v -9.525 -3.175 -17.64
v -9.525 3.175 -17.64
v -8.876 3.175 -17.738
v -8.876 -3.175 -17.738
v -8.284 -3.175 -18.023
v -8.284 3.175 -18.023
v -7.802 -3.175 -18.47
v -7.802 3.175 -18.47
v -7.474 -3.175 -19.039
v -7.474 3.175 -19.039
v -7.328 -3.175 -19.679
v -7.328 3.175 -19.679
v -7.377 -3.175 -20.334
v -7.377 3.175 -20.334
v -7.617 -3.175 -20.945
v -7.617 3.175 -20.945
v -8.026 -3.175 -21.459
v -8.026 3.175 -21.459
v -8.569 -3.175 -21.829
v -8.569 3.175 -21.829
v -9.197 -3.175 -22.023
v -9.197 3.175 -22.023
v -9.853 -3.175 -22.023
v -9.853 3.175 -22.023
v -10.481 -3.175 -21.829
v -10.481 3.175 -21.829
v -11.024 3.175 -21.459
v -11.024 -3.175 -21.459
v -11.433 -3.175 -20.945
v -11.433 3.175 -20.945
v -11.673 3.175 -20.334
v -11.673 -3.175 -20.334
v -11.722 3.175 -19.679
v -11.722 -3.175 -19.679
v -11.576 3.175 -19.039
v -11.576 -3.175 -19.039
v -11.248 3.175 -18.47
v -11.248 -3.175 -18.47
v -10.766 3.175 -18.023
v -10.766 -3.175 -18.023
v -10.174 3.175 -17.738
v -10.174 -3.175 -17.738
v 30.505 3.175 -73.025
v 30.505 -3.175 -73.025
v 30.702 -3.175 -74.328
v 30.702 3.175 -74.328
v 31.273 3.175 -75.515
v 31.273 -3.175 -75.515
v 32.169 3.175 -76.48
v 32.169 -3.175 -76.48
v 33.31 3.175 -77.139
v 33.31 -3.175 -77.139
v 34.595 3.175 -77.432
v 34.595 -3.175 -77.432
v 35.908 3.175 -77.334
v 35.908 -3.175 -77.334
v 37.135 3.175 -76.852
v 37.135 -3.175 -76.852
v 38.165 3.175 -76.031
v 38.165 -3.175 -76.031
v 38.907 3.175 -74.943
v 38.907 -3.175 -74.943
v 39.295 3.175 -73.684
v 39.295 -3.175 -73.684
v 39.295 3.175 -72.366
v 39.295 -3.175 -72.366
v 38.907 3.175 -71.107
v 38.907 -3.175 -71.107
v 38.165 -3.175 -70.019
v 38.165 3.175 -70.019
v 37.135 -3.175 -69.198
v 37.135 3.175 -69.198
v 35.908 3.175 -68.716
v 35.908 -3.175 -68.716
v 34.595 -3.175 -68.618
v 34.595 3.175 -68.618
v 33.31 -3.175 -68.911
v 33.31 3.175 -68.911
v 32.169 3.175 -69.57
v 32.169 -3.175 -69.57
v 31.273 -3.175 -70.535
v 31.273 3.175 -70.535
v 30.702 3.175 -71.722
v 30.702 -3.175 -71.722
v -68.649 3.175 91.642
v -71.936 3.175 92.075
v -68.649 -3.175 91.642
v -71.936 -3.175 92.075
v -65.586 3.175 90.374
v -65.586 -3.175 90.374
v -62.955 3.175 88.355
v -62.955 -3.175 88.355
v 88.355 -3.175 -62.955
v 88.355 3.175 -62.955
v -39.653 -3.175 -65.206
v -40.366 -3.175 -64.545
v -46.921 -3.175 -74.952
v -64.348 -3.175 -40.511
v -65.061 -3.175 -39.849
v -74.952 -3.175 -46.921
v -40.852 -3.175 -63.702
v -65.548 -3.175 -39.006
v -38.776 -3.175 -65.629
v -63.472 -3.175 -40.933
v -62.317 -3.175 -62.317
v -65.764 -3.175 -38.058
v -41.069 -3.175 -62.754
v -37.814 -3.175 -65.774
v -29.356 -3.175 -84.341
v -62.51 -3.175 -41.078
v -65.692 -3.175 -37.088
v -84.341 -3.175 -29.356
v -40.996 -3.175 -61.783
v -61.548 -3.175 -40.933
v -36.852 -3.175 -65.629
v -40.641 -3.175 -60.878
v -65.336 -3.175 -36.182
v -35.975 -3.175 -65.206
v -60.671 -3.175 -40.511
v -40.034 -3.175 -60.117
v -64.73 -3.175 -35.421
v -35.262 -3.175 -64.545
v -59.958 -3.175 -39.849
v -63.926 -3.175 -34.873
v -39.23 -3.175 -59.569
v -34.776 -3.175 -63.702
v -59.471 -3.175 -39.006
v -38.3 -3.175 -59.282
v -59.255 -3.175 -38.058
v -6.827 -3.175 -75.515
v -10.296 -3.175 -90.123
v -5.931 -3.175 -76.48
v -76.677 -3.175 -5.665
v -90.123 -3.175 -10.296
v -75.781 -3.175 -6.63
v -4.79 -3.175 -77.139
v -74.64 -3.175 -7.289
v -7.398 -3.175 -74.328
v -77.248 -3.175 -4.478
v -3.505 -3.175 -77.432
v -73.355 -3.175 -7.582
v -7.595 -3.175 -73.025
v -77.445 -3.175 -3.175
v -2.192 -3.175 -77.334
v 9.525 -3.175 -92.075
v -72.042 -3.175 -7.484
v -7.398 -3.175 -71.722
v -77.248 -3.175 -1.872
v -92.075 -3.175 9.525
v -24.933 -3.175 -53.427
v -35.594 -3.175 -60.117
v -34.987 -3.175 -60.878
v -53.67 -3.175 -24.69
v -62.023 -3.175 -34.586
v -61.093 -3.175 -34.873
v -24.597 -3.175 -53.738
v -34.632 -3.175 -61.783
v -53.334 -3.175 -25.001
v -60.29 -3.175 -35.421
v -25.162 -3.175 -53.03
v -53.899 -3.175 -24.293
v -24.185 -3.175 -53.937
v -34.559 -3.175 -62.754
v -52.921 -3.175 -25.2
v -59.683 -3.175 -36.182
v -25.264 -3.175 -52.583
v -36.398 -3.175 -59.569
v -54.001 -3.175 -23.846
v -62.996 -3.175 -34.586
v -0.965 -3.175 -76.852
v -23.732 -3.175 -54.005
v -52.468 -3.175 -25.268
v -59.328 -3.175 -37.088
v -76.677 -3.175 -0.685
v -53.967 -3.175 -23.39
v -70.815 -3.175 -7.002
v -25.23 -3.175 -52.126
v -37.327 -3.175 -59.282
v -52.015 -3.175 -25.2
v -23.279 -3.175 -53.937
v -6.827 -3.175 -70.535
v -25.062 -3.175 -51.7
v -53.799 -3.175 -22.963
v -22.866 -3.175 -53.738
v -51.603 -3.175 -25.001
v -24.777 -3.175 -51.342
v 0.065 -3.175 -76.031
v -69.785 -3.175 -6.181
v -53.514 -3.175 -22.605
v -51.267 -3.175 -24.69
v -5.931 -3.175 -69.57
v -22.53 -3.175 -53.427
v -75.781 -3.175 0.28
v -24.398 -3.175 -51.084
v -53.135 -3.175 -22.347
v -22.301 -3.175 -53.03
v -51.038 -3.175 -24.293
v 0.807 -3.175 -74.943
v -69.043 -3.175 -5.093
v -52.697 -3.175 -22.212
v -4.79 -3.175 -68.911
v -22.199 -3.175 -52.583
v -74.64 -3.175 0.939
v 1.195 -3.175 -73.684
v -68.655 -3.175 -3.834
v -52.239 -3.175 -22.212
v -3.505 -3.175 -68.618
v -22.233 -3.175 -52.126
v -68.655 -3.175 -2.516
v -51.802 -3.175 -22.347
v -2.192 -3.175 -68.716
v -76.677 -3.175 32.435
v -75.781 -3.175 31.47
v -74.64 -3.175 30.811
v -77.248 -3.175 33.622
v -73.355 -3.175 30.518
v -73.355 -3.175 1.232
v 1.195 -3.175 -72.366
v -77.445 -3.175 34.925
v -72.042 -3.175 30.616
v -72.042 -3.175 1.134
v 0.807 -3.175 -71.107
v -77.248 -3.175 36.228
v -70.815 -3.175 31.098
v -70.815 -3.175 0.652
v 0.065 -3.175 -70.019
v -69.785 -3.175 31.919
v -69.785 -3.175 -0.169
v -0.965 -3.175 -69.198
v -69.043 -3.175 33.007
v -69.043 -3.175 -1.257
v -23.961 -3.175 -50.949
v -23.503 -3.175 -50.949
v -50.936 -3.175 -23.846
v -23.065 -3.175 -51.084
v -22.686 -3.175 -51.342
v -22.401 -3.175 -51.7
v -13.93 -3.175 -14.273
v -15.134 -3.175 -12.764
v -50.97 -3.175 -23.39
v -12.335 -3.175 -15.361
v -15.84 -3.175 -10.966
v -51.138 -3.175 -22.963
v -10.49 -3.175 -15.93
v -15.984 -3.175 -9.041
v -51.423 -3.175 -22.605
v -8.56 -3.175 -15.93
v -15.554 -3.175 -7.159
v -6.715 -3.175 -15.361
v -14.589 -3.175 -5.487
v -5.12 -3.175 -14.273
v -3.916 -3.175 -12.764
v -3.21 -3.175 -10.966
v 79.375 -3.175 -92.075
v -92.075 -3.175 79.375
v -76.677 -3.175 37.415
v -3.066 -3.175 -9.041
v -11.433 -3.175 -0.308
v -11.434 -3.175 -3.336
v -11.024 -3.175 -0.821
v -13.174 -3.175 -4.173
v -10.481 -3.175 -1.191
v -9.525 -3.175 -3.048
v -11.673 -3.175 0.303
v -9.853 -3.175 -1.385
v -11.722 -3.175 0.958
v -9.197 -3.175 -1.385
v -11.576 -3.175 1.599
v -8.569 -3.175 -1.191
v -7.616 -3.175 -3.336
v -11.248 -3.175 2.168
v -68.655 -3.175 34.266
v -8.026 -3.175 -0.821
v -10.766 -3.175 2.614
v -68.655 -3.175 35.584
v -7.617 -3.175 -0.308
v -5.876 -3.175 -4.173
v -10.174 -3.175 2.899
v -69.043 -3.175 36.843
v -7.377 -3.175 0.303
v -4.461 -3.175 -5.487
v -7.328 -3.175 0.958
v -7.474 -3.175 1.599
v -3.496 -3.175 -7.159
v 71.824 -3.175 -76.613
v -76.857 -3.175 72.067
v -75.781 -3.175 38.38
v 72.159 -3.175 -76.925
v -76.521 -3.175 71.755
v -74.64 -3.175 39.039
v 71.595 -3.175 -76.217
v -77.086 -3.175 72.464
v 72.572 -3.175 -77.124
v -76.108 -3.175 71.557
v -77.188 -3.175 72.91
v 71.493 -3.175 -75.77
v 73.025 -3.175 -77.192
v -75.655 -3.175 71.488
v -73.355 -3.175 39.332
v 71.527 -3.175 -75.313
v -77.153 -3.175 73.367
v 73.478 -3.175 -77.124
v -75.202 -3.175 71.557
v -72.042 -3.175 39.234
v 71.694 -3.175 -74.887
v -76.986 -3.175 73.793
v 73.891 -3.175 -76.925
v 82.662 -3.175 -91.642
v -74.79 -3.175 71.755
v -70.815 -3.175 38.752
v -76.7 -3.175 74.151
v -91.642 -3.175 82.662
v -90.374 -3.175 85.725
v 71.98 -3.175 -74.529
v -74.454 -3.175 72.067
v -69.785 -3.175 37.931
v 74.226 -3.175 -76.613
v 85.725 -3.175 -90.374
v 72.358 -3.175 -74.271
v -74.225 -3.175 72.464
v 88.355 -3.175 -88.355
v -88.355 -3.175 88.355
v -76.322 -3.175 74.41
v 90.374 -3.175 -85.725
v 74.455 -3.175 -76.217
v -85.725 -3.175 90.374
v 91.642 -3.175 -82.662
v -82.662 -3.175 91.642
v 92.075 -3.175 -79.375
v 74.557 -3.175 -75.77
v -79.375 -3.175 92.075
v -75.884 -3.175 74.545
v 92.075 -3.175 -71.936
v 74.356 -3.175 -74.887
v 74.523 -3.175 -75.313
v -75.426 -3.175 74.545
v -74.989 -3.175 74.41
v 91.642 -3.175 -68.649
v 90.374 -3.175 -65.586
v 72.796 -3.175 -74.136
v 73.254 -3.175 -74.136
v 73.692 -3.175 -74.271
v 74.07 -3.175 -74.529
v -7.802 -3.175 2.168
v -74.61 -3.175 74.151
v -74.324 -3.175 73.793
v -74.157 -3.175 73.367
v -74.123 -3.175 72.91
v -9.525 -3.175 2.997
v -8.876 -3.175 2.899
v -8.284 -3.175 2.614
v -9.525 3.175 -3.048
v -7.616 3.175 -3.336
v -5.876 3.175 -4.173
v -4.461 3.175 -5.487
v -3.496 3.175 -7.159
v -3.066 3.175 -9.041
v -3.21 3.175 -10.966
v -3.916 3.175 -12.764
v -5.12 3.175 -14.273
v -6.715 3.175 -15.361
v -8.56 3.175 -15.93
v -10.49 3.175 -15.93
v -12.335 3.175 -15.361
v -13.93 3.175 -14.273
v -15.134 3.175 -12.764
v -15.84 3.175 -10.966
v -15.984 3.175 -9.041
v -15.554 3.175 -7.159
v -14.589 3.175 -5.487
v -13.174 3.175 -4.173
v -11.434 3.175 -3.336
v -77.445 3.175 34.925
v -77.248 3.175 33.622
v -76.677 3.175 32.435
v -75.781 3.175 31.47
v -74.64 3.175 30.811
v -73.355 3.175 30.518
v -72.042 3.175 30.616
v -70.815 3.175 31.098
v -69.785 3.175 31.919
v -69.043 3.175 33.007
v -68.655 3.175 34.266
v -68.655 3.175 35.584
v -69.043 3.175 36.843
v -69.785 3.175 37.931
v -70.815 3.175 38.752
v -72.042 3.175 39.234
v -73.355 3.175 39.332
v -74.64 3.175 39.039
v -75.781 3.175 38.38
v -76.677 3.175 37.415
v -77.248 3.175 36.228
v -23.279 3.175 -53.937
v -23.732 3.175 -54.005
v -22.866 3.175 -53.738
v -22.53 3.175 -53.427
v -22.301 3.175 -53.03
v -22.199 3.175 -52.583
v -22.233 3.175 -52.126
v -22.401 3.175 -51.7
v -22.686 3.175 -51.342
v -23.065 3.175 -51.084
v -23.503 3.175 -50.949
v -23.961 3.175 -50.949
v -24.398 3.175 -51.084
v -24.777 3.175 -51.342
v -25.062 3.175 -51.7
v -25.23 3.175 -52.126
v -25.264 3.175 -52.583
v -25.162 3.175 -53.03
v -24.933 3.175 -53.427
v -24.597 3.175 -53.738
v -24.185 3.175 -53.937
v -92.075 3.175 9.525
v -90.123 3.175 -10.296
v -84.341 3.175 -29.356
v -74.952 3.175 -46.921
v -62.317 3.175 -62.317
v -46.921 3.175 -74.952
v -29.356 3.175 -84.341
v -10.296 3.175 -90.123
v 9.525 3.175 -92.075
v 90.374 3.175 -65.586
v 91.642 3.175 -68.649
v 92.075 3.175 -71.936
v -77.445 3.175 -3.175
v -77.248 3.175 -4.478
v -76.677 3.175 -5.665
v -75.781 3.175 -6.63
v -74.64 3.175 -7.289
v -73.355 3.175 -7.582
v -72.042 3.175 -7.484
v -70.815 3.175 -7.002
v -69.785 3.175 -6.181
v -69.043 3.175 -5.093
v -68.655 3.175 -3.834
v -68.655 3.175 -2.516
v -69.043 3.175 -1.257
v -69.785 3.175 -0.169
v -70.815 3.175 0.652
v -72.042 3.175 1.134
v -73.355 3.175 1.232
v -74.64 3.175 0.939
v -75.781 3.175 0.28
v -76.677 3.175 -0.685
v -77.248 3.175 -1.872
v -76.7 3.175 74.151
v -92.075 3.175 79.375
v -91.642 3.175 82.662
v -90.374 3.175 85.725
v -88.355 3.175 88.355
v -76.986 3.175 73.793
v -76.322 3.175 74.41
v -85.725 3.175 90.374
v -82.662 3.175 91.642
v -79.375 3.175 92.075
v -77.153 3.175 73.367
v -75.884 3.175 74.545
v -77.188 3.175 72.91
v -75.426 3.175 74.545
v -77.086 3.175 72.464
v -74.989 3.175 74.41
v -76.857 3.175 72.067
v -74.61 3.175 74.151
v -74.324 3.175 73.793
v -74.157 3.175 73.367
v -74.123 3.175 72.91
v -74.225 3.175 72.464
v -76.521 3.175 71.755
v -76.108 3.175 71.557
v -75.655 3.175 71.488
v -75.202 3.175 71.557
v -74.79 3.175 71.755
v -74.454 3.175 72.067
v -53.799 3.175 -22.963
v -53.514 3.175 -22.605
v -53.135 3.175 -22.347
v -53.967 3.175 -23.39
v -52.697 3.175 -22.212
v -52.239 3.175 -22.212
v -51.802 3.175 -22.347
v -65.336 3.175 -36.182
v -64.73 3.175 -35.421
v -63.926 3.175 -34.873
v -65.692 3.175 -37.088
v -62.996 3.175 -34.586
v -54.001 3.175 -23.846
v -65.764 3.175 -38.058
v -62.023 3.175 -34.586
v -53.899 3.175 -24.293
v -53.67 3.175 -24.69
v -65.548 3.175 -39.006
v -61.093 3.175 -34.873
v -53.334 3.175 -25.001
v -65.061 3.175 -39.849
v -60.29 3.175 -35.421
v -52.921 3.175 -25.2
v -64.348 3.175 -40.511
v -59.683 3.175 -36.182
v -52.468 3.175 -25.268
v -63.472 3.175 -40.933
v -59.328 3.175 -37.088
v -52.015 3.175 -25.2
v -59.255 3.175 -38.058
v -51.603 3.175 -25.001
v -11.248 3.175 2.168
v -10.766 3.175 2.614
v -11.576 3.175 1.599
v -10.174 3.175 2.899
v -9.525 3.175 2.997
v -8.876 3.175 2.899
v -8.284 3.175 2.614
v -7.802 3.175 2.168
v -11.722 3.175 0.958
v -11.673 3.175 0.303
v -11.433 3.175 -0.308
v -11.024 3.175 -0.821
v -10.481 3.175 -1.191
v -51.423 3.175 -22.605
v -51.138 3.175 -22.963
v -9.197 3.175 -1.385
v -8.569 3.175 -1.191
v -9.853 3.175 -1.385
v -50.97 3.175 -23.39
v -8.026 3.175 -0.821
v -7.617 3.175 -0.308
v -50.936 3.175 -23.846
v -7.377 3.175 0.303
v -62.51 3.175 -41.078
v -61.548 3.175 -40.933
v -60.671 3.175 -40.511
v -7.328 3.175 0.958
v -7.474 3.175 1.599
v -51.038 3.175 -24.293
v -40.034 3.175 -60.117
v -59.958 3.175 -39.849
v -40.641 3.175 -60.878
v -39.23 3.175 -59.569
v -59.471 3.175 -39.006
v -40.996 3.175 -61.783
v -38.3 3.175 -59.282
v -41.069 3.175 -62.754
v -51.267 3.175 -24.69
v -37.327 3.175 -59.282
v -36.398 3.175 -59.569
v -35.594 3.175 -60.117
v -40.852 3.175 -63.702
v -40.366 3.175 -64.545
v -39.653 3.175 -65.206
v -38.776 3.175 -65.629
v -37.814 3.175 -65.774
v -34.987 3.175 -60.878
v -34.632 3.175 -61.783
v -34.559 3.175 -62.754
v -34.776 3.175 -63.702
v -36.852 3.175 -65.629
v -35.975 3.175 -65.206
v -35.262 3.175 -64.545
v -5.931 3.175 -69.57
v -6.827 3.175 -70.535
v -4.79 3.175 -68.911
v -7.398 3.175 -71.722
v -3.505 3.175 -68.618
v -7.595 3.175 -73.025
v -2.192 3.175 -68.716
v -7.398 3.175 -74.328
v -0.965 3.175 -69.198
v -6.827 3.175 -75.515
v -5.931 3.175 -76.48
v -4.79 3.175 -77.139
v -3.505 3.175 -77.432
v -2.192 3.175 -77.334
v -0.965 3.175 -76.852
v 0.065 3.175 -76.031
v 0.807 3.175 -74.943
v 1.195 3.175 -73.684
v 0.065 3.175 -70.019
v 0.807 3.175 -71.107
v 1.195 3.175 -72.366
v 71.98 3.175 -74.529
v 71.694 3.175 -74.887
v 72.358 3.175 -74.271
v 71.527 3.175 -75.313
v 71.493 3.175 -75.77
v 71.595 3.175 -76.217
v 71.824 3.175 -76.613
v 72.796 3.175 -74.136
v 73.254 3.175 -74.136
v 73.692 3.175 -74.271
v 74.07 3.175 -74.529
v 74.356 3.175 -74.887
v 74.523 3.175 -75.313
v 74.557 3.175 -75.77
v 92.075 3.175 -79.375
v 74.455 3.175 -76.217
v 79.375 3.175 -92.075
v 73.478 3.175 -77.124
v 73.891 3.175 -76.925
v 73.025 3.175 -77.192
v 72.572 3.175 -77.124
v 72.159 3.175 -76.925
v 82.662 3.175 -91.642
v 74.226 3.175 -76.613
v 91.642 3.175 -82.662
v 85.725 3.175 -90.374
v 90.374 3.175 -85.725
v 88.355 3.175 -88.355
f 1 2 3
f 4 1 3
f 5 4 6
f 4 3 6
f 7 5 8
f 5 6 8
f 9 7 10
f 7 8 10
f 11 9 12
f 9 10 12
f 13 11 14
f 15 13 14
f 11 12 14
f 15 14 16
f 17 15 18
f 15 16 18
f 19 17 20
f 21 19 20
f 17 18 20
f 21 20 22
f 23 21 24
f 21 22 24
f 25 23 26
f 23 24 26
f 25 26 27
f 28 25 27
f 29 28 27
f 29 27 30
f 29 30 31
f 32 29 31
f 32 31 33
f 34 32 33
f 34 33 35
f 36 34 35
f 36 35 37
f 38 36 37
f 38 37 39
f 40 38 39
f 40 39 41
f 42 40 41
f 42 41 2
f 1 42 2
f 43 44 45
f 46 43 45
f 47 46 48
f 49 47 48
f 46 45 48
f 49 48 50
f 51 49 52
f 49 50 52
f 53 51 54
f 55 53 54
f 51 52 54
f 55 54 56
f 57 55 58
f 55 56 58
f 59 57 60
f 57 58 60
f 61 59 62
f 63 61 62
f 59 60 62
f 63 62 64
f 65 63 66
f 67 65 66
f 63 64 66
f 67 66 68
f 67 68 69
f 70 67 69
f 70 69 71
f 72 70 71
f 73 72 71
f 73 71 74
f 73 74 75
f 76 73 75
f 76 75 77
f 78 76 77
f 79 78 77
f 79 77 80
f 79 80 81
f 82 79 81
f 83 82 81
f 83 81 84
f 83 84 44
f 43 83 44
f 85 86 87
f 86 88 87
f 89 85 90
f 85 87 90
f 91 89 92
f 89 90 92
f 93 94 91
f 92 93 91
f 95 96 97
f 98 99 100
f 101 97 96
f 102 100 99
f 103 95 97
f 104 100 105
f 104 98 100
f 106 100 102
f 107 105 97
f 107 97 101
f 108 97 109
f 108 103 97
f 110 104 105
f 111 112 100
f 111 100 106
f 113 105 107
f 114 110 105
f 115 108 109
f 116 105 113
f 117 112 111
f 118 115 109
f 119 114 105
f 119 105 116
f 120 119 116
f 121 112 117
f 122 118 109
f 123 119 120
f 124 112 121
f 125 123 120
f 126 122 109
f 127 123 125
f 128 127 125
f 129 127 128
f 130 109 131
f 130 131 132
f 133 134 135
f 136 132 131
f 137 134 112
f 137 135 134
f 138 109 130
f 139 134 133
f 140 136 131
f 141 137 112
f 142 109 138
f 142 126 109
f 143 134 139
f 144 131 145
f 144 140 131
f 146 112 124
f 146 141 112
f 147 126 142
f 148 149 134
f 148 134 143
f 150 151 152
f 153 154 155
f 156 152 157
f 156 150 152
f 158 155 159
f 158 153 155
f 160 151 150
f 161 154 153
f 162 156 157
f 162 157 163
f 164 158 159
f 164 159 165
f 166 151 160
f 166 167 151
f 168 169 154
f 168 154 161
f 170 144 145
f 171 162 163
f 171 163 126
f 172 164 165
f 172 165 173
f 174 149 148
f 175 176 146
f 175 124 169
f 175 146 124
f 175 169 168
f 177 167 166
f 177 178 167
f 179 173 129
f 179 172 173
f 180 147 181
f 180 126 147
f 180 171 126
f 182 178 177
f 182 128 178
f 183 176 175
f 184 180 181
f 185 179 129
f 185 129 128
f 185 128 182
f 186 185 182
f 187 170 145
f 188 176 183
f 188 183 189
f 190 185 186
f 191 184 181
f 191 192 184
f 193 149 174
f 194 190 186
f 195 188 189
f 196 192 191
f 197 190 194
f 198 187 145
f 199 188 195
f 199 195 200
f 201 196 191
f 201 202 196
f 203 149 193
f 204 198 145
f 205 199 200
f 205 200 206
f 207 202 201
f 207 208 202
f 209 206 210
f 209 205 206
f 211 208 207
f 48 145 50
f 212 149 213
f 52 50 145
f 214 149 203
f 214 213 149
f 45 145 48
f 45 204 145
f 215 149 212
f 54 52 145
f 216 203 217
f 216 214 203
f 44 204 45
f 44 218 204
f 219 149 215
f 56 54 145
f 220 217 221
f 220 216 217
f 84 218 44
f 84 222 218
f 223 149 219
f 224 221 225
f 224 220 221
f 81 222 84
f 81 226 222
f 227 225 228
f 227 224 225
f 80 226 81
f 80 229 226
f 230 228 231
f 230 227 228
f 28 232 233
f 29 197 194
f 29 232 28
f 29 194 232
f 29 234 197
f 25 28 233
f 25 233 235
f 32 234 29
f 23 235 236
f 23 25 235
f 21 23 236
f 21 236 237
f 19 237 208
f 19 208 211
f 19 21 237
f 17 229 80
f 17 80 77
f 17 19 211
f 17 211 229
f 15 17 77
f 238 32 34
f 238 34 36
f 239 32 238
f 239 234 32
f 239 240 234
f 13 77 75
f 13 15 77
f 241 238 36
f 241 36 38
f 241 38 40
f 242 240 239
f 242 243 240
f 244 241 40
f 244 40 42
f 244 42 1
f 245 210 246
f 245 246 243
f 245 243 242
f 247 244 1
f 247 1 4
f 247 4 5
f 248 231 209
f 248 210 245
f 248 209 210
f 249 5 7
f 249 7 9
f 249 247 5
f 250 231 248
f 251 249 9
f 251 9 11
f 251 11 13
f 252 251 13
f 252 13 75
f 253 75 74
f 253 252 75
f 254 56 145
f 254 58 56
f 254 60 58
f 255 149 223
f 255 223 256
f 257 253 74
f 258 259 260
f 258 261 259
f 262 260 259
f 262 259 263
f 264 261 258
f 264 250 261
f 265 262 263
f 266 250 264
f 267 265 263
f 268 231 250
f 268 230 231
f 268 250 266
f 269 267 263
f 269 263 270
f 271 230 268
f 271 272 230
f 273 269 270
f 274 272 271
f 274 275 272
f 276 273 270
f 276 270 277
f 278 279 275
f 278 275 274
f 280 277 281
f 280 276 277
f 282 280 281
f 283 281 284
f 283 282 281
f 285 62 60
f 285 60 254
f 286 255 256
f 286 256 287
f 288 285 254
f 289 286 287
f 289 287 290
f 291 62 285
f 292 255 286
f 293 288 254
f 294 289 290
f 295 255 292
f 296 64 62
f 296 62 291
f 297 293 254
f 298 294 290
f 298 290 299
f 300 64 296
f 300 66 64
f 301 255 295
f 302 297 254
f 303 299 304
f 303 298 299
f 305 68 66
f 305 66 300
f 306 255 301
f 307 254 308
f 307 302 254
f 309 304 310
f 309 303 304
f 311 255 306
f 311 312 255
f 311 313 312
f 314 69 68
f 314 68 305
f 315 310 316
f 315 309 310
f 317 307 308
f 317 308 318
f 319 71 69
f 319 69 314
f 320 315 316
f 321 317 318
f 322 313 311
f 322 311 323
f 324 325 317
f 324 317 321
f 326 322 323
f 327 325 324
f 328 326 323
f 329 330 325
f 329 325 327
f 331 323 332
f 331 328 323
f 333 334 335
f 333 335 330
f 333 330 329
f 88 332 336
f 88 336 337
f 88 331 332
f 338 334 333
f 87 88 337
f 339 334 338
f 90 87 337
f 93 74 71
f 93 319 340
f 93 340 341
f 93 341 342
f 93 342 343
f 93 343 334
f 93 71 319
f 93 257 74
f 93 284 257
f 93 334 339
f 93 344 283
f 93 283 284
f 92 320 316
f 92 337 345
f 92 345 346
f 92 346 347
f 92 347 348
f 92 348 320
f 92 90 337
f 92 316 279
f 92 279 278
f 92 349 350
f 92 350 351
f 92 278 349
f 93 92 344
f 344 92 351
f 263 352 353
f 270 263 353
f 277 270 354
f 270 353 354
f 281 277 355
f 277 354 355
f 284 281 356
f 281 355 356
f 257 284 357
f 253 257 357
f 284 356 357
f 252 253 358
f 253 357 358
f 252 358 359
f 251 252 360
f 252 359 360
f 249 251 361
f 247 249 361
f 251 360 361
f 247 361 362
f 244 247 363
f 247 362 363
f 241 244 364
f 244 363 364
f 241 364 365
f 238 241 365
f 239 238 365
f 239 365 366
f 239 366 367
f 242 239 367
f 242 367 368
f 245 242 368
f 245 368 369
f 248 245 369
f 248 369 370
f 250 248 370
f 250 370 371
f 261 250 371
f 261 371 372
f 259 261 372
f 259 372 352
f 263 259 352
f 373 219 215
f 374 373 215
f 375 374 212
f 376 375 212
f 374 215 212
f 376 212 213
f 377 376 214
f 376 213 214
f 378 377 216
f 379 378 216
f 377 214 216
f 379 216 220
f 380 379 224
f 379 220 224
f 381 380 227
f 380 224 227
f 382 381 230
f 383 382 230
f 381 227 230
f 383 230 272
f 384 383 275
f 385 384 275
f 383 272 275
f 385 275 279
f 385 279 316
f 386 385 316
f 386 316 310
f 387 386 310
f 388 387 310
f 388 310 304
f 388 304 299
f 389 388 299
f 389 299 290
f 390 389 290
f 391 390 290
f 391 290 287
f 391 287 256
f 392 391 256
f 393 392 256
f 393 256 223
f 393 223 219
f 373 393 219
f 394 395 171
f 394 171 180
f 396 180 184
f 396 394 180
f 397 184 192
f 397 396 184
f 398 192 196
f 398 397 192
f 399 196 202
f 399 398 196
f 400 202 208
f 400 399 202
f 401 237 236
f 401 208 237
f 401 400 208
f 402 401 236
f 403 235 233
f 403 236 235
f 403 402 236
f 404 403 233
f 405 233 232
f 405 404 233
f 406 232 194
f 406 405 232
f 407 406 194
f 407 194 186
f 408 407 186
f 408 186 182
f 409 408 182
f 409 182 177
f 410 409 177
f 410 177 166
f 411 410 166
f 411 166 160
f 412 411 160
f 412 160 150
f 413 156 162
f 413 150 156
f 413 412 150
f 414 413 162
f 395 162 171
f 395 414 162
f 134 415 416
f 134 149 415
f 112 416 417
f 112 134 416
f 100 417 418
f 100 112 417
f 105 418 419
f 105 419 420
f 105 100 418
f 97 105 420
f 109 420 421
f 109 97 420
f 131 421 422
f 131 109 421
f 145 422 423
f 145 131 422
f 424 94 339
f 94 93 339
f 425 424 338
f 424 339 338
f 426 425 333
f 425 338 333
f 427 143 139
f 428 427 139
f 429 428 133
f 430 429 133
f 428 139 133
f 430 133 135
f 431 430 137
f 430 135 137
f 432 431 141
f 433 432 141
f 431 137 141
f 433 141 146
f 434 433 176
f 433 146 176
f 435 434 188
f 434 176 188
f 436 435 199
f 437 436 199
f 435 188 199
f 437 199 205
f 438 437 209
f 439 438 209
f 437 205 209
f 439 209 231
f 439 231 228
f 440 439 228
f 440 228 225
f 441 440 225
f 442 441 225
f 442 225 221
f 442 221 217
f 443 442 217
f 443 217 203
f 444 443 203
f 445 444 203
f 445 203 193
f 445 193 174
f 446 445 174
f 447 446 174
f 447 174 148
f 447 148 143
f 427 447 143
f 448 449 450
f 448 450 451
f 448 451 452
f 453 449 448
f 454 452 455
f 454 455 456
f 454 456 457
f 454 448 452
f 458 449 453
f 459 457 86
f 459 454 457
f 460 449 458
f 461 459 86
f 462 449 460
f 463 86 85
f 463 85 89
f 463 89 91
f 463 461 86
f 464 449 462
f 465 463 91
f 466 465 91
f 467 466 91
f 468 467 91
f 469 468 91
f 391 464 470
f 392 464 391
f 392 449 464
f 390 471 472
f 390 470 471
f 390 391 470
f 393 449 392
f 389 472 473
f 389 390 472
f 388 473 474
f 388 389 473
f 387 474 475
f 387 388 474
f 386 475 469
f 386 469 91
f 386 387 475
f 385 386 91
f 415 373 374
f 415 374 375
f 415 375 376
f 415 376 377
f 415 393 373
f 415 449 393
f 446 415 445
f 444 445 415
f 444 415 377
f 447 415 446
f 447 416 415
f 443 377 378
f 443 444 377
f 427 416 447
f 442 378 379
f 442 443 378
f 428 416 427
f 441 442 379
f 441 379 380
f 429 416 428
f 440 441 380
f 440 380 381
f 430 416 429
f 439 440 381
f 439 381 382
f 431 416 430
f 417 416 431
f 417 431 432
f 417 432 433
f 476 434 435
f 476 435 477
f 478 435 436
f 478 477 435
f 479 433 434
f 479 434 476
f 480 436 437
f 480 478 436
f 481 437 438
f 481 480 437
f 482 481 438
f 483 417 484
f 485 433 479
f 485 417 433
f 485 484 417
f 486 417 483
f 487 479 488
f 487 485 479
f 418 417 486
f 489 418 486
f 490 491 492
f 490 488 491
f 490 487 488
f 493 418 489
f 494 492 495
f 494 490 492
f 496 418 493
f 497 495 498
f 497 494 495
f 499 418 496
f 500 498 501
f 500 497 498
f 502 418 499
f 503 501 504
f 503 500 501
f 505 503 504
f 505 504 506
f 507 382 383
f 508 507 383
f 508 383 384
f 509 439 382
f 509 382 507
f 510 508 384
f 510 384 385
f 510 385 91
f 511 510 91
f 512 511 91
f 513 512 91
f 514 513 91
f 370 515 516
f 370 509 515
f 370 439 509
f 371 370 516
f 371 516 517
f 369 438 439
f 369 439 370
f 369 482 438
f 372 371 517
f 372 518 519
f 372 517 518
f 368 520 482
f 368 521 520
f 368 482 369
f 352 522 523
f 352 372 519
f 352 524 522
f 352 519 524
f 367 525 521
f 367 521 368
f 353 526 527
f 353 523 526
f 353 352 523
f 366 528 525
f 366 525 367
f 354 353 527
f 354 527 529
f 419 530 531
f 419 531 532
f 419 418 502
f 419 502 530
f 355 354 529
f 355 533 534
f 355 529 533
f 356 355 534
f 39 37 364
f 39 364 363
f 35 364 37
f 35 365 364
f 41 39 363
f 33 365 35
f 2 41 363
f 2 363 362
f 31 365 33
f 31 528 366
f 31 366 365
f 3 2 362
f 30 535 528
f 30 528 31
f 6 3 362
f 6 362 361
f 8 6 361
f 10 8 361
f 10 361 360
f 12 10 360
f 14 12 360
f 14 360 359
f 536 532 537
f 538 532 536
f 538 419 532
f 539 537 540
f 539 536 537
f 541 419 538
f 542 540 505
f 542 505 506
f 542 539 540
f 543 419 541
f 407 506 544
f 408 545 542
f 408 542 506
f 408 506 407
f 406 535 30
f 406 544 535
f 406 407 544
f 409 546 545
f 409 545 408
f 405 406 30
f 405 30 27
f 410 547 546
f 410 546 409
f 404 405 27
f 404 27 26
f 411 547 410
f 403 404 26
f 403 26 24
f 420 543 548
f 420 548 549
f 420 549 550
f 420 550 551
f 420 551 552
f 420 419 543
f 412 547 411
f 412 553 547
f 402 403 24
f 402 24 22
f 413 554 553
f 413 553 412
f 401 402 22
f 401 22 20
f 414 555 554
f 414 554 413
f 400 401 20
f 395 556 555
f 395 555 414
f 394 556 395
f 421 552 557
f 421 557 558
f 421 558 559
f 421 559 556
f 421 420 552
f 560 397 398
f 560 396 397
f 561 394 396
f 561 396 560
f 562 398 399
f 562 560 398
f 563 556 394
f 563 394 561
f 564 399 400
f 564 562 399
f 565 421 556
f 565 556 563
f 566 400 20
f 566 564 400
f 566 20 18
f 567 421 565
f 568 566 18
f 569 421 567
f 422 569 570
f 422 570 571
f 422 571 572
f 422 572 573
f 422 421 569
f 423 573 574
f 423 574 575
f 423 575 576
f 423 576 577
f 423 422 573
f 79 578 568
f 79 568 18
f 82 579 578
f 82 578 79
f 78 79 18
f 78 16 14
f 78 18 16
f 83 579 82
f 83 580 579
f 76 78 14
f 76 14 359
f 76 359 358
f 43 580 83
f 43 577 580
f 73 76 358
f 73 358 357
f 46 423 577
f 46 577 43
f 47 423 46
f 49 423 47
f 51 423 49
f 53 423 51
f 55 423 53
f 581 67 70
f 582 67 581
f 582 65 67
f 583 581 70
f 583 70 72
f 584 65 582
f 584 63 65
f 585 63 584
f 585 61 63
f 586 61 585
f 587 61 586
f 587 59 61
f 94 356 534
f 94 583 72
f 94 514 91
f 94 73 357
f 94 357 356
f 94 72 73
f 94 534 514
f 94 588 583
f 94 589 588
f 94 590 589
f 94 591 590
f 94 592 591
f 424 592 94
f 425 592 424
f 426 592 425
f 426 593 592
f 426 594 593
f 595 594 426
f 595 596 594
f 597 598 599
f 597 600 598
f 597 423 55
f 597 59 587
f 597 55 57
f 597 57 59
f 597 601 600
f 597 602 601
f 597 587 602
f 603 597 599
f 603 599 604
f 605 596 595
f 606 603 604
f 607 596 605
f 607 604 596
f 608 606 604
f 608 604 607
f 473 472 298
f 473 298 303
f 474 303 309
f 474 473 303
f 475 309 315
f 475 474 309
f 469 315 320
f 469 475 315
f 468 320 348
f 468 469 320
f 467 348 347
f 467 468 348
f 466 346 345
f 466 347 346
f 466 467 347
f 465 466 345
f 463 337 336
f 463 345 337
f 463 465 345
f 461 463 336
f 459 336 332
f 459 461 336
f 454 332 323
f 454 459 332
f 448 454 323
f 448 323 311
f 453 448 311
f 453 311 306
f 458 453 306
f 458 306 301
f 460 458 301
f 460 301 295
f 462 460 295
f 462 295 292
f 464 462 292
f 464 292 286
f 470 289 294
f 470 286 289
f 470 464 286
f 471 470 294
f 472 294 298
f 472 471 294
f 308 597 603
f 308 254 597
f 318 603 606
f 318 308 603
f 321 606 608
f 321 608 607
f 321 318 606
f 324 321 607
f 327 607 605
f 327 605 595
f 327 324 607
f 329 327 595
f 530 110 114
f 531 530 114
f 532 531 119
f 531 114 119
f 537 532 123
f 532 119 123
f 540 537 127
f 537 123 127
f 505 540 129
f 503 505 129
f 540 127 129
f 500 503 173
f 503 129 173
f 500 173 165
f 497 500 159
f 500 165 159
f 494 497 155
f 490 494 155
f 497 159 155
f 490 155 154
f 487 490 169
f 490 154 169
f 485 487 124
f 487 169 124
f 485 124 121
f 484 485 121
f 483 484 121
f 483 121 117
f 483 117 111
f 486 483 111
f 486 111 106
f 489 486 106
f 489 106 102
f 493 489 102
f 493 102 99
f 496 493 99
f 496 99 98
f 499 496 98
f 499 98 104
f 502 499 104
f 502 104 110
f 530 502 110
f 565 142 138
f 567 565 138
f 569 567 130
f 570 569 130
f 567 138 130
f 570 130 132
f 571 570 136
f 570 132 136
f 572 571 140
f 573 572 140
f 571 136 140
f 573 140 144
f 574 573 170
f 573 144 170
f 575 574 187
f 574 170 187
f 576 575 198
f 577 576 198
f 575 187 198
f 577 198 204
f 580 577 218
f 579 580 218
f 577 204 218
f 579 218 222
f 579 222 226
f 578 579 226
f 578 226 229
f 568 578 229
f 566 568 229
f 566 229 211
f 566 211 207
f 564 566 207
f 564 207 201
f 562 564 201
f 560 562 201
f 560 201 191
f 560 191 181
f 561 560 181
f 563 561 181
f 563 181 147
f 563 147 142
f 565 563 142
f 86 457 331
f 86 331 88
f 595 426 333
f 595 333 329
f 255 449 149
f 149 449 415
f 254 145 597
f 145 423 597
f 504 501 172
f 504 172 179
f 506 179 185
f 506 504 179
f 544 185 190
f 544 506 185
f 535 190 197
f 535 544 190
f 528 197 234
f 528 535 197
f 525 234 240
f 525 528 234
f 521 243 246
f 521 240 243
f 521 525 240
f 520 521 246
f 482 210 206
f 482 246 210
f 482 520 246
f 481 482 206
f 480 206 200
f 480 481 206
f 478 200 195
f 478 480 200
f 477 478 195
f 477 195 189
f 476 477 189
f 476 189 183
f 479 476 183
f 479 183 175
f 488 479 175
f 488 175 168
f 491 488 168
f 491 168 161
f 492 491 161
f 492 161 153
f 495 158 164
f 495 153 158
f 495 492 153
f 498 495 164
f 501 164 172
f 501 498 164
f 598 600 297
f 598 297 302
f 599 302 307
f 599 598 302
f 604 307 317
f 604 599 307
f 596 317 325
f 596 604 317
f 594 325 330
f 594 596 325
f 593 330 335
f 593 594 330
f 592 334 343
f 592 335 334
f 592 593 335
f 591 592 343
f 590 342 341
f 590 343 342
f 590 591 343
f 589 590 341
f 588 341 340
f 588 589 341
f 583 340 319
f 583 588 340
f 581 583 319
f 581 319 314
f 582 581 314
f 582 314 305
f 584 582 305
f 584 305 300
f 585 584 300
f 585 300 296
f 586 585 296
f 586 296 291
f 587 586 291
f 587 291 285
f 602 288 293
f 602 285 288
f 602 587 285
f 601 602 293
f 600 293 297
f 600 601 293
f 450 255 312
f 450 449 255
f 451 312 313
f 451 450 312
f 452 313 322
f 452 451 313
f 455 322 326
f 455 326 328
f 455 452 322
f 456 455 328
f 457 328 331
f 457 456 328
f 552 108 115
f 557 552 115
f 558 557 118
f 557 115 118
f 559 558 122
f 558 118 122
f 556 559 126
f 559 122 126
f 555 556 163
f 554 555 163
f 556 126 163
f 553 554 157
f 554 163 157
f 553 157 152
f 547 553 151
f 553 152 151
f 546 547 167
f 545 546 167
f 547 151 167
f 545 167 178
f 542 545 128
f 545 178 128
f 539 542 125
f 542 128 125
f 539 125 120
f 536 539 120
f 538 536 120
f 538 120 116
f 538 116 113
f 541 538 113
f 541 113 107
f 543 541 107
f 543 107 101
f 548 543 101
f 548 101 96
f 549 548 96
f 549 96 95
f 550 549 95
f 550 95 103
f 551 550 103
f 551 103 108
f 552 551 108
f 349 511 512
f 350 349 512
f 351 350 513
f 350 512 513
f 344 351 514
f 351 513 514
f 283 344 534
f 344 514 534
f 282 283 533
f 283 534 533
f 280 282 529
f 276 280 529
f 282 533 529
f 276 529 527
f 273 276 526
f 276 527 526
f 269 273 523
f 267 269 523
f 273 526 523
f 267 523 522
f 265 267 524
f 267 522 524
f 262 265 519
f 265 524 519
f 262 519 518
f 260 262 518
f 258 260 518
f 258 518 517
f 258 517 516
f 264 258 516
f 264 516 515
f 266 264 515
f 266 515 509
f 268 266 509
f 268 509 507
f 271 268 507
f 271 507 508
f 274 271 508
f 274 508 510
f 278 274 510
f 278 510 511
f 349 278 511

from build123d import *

# Parameters (mm, degrees)
SKETCH1_W                = 184.15
SKETCH1_H                = 184.15
BOSS_EXTRUDE1_DEPTH      = 3.175
CUT_EXTRUDE1_DEPTH       = 131.368453815
SKETCH3_R                = 6.477
SKETCH3_R_2              = 2.20345
CUT_EXTRUDE2_DEPTH       = 131.368453815
F_0_332_DIAMETER_HOLE1_D = 8.8392
FILLET1_R                = 12.7
FILLET2_R                = 101.6
CUT_EXTRUDE3_DEPTH       = 131.368453815
CUT_EXTRUDE3_DEPTH_BACK  = 131.368453815
SKETCH6_R                = 1.5367
SKETCH7_R                = 12.827
SKETCH7_R_2              = 3.2639
CUT_EXTRUDE4_DEPTH       = 131.368453815
SKETCH8_R                = 12.827
BOSS_EXTRUDE2_DEPTH      = 6.35


with BuildPart() as part:
    # Sketch1 → Boss-Extrude1 (new, symmetric)
    with BuildSketch(Plane(origin=(0, 0, 0), x_dir=(1, 0, 0), z_dir=(0, 1, 0))):
        Rectangle(SKETCH1_W, SKETCH1_H)
    extrude(amount=BOSS_EXTRUDE1_DEPTH, both=True)

    # Sketch2 → Cut-Extrude1 (cut, through all)
    with BuildSketch(Plane(origin=(0, 3.175, 0), x_dir=(1, 0, 0), z_dir=(0, 1, 0))):
        Polygon((92.075, -92.075), (92.075, 66.675), (-66.675, -92.075), align=None)
    extrude(amount=-CUT_EXTRUDE1_DEPTH, mode=Mode.SUBTRACT)

    # Sketch3 → Cut-Extrude2 (cut, through all)
    with BuildSketch(Plane(origin=(0, 3.175, 0), x_dir=(1, 0, 0), z_dir=(0, 1, 0))):
        with Locations(Location((-9.525, 9.525, 0), (0, 0, 270))):
            Circle(SKETCH3_R)
        with Locations(Location((-9.525, 19.84375, 0), (0, 0, 270))):
            Circle(SKETCH3_R_2)
        with Locations(Location((-9.525, -0.79375, 0), (0, 0, 270))):
            Circle(SKETCH3_R_2)
    extrude(amount=-CUT_EXTRUDE2_DEPTH, mode=Mode.SUBTRACT)

    # 0.332_ Diameter Hole1 (through all)
    with Locations(Plane(origin=(0, 3.175, 0), x_dir=(1, 0, 0), z_dir=(0, 1, 0))):
        with Locations((-73.025, -34.925), (-3.175, 73.025), (34.925, 73.025), (-73.025, 3.175)):
            Hole(F_0_332_DIAMETER_HOLE1_D / 2)

    # Fillet1
    fillet1_edges = [part.edges().sort_by_distance(p)[0] for p in [
        (-66.675, 0, 92.075),
        (92.075, 0, -66.675),
        (-92.075, 0, 92.075),
        (92.075, 0, -92.075),
    ]]
    fillet(fillet1_edges, radius=FILLET1_R)

    # Fillet2
    fillet2_edges = [part.edges().sort_by_distance(p)[0] for p in [
        (-92.075, 0, -92.075),
    ]]
    fillet(fillet2_edges, radius=FILLET2_R)

    # Sketch6 → Cut-Extrude3 (cut, two sides: drawn at the far end of the back side and taken through both)
    with BuildSketch(Plane.XZ.offset(3.175).offset(-CUT_EXTRUDE3_DEPTH_BACK)):
        with Locations(Location((73.025, -75.655256121, 0), (0, 0, 270))):
            Circle(SKETCH6_R)
        with Locations(Location((-23.731590206, -52.468409794, 0), (0, 0, 270))):
            Circle(SKETCH6_R)
        with Locations(Location((-75.655256121, 73.025, 0), (0, 0, 270))):
            Circle(SKETCH6_R)
        with Locations(Location((-52.468409794, -23.731590206, 0), (0, 0, 270))):
            Circle(SKETCH6_R)
    extrude(amount=CUT_EXTRUDE3_DEPTH + CUT_EXTRUDE3_DEPTH_BACK, mode=Mode.SUBTRACT)

    # Sketch7 → Cut-Extrude4 (cut, through all)
    with BuildSketch(Plane.XZ.offset(3.175)):
        with Locations(Location((-50.161792847, -50.161792847, 0), (0, 0, 270))):
            Circle(SKETCH7_R)
        with Locations(Location((-37.813940681, -62.509645014, 0), (0, 0, 270))):
            Circle(SKETCH7_R_2)
        with Locations(Location((-62.509645014, -37.813940681, 0), (0, 0, 270))):
            Circle(SKETCH7_R_2)
    extrude(amount=-CUT_EXTRUDE4_DEPTH, mode=Mode.SUBTRACT)

    # Sketch8 → Boss-Extrude2 (add)
    with BuildSketch(Plane.XZ.offset(3.175)):
        with Locations((-50.161792847, -50.161792847)):
            Circle(SKETCH8_R)
    extrude(amount=-BOSS_EXTRUDE2_DEPTH)


solid = part.part
